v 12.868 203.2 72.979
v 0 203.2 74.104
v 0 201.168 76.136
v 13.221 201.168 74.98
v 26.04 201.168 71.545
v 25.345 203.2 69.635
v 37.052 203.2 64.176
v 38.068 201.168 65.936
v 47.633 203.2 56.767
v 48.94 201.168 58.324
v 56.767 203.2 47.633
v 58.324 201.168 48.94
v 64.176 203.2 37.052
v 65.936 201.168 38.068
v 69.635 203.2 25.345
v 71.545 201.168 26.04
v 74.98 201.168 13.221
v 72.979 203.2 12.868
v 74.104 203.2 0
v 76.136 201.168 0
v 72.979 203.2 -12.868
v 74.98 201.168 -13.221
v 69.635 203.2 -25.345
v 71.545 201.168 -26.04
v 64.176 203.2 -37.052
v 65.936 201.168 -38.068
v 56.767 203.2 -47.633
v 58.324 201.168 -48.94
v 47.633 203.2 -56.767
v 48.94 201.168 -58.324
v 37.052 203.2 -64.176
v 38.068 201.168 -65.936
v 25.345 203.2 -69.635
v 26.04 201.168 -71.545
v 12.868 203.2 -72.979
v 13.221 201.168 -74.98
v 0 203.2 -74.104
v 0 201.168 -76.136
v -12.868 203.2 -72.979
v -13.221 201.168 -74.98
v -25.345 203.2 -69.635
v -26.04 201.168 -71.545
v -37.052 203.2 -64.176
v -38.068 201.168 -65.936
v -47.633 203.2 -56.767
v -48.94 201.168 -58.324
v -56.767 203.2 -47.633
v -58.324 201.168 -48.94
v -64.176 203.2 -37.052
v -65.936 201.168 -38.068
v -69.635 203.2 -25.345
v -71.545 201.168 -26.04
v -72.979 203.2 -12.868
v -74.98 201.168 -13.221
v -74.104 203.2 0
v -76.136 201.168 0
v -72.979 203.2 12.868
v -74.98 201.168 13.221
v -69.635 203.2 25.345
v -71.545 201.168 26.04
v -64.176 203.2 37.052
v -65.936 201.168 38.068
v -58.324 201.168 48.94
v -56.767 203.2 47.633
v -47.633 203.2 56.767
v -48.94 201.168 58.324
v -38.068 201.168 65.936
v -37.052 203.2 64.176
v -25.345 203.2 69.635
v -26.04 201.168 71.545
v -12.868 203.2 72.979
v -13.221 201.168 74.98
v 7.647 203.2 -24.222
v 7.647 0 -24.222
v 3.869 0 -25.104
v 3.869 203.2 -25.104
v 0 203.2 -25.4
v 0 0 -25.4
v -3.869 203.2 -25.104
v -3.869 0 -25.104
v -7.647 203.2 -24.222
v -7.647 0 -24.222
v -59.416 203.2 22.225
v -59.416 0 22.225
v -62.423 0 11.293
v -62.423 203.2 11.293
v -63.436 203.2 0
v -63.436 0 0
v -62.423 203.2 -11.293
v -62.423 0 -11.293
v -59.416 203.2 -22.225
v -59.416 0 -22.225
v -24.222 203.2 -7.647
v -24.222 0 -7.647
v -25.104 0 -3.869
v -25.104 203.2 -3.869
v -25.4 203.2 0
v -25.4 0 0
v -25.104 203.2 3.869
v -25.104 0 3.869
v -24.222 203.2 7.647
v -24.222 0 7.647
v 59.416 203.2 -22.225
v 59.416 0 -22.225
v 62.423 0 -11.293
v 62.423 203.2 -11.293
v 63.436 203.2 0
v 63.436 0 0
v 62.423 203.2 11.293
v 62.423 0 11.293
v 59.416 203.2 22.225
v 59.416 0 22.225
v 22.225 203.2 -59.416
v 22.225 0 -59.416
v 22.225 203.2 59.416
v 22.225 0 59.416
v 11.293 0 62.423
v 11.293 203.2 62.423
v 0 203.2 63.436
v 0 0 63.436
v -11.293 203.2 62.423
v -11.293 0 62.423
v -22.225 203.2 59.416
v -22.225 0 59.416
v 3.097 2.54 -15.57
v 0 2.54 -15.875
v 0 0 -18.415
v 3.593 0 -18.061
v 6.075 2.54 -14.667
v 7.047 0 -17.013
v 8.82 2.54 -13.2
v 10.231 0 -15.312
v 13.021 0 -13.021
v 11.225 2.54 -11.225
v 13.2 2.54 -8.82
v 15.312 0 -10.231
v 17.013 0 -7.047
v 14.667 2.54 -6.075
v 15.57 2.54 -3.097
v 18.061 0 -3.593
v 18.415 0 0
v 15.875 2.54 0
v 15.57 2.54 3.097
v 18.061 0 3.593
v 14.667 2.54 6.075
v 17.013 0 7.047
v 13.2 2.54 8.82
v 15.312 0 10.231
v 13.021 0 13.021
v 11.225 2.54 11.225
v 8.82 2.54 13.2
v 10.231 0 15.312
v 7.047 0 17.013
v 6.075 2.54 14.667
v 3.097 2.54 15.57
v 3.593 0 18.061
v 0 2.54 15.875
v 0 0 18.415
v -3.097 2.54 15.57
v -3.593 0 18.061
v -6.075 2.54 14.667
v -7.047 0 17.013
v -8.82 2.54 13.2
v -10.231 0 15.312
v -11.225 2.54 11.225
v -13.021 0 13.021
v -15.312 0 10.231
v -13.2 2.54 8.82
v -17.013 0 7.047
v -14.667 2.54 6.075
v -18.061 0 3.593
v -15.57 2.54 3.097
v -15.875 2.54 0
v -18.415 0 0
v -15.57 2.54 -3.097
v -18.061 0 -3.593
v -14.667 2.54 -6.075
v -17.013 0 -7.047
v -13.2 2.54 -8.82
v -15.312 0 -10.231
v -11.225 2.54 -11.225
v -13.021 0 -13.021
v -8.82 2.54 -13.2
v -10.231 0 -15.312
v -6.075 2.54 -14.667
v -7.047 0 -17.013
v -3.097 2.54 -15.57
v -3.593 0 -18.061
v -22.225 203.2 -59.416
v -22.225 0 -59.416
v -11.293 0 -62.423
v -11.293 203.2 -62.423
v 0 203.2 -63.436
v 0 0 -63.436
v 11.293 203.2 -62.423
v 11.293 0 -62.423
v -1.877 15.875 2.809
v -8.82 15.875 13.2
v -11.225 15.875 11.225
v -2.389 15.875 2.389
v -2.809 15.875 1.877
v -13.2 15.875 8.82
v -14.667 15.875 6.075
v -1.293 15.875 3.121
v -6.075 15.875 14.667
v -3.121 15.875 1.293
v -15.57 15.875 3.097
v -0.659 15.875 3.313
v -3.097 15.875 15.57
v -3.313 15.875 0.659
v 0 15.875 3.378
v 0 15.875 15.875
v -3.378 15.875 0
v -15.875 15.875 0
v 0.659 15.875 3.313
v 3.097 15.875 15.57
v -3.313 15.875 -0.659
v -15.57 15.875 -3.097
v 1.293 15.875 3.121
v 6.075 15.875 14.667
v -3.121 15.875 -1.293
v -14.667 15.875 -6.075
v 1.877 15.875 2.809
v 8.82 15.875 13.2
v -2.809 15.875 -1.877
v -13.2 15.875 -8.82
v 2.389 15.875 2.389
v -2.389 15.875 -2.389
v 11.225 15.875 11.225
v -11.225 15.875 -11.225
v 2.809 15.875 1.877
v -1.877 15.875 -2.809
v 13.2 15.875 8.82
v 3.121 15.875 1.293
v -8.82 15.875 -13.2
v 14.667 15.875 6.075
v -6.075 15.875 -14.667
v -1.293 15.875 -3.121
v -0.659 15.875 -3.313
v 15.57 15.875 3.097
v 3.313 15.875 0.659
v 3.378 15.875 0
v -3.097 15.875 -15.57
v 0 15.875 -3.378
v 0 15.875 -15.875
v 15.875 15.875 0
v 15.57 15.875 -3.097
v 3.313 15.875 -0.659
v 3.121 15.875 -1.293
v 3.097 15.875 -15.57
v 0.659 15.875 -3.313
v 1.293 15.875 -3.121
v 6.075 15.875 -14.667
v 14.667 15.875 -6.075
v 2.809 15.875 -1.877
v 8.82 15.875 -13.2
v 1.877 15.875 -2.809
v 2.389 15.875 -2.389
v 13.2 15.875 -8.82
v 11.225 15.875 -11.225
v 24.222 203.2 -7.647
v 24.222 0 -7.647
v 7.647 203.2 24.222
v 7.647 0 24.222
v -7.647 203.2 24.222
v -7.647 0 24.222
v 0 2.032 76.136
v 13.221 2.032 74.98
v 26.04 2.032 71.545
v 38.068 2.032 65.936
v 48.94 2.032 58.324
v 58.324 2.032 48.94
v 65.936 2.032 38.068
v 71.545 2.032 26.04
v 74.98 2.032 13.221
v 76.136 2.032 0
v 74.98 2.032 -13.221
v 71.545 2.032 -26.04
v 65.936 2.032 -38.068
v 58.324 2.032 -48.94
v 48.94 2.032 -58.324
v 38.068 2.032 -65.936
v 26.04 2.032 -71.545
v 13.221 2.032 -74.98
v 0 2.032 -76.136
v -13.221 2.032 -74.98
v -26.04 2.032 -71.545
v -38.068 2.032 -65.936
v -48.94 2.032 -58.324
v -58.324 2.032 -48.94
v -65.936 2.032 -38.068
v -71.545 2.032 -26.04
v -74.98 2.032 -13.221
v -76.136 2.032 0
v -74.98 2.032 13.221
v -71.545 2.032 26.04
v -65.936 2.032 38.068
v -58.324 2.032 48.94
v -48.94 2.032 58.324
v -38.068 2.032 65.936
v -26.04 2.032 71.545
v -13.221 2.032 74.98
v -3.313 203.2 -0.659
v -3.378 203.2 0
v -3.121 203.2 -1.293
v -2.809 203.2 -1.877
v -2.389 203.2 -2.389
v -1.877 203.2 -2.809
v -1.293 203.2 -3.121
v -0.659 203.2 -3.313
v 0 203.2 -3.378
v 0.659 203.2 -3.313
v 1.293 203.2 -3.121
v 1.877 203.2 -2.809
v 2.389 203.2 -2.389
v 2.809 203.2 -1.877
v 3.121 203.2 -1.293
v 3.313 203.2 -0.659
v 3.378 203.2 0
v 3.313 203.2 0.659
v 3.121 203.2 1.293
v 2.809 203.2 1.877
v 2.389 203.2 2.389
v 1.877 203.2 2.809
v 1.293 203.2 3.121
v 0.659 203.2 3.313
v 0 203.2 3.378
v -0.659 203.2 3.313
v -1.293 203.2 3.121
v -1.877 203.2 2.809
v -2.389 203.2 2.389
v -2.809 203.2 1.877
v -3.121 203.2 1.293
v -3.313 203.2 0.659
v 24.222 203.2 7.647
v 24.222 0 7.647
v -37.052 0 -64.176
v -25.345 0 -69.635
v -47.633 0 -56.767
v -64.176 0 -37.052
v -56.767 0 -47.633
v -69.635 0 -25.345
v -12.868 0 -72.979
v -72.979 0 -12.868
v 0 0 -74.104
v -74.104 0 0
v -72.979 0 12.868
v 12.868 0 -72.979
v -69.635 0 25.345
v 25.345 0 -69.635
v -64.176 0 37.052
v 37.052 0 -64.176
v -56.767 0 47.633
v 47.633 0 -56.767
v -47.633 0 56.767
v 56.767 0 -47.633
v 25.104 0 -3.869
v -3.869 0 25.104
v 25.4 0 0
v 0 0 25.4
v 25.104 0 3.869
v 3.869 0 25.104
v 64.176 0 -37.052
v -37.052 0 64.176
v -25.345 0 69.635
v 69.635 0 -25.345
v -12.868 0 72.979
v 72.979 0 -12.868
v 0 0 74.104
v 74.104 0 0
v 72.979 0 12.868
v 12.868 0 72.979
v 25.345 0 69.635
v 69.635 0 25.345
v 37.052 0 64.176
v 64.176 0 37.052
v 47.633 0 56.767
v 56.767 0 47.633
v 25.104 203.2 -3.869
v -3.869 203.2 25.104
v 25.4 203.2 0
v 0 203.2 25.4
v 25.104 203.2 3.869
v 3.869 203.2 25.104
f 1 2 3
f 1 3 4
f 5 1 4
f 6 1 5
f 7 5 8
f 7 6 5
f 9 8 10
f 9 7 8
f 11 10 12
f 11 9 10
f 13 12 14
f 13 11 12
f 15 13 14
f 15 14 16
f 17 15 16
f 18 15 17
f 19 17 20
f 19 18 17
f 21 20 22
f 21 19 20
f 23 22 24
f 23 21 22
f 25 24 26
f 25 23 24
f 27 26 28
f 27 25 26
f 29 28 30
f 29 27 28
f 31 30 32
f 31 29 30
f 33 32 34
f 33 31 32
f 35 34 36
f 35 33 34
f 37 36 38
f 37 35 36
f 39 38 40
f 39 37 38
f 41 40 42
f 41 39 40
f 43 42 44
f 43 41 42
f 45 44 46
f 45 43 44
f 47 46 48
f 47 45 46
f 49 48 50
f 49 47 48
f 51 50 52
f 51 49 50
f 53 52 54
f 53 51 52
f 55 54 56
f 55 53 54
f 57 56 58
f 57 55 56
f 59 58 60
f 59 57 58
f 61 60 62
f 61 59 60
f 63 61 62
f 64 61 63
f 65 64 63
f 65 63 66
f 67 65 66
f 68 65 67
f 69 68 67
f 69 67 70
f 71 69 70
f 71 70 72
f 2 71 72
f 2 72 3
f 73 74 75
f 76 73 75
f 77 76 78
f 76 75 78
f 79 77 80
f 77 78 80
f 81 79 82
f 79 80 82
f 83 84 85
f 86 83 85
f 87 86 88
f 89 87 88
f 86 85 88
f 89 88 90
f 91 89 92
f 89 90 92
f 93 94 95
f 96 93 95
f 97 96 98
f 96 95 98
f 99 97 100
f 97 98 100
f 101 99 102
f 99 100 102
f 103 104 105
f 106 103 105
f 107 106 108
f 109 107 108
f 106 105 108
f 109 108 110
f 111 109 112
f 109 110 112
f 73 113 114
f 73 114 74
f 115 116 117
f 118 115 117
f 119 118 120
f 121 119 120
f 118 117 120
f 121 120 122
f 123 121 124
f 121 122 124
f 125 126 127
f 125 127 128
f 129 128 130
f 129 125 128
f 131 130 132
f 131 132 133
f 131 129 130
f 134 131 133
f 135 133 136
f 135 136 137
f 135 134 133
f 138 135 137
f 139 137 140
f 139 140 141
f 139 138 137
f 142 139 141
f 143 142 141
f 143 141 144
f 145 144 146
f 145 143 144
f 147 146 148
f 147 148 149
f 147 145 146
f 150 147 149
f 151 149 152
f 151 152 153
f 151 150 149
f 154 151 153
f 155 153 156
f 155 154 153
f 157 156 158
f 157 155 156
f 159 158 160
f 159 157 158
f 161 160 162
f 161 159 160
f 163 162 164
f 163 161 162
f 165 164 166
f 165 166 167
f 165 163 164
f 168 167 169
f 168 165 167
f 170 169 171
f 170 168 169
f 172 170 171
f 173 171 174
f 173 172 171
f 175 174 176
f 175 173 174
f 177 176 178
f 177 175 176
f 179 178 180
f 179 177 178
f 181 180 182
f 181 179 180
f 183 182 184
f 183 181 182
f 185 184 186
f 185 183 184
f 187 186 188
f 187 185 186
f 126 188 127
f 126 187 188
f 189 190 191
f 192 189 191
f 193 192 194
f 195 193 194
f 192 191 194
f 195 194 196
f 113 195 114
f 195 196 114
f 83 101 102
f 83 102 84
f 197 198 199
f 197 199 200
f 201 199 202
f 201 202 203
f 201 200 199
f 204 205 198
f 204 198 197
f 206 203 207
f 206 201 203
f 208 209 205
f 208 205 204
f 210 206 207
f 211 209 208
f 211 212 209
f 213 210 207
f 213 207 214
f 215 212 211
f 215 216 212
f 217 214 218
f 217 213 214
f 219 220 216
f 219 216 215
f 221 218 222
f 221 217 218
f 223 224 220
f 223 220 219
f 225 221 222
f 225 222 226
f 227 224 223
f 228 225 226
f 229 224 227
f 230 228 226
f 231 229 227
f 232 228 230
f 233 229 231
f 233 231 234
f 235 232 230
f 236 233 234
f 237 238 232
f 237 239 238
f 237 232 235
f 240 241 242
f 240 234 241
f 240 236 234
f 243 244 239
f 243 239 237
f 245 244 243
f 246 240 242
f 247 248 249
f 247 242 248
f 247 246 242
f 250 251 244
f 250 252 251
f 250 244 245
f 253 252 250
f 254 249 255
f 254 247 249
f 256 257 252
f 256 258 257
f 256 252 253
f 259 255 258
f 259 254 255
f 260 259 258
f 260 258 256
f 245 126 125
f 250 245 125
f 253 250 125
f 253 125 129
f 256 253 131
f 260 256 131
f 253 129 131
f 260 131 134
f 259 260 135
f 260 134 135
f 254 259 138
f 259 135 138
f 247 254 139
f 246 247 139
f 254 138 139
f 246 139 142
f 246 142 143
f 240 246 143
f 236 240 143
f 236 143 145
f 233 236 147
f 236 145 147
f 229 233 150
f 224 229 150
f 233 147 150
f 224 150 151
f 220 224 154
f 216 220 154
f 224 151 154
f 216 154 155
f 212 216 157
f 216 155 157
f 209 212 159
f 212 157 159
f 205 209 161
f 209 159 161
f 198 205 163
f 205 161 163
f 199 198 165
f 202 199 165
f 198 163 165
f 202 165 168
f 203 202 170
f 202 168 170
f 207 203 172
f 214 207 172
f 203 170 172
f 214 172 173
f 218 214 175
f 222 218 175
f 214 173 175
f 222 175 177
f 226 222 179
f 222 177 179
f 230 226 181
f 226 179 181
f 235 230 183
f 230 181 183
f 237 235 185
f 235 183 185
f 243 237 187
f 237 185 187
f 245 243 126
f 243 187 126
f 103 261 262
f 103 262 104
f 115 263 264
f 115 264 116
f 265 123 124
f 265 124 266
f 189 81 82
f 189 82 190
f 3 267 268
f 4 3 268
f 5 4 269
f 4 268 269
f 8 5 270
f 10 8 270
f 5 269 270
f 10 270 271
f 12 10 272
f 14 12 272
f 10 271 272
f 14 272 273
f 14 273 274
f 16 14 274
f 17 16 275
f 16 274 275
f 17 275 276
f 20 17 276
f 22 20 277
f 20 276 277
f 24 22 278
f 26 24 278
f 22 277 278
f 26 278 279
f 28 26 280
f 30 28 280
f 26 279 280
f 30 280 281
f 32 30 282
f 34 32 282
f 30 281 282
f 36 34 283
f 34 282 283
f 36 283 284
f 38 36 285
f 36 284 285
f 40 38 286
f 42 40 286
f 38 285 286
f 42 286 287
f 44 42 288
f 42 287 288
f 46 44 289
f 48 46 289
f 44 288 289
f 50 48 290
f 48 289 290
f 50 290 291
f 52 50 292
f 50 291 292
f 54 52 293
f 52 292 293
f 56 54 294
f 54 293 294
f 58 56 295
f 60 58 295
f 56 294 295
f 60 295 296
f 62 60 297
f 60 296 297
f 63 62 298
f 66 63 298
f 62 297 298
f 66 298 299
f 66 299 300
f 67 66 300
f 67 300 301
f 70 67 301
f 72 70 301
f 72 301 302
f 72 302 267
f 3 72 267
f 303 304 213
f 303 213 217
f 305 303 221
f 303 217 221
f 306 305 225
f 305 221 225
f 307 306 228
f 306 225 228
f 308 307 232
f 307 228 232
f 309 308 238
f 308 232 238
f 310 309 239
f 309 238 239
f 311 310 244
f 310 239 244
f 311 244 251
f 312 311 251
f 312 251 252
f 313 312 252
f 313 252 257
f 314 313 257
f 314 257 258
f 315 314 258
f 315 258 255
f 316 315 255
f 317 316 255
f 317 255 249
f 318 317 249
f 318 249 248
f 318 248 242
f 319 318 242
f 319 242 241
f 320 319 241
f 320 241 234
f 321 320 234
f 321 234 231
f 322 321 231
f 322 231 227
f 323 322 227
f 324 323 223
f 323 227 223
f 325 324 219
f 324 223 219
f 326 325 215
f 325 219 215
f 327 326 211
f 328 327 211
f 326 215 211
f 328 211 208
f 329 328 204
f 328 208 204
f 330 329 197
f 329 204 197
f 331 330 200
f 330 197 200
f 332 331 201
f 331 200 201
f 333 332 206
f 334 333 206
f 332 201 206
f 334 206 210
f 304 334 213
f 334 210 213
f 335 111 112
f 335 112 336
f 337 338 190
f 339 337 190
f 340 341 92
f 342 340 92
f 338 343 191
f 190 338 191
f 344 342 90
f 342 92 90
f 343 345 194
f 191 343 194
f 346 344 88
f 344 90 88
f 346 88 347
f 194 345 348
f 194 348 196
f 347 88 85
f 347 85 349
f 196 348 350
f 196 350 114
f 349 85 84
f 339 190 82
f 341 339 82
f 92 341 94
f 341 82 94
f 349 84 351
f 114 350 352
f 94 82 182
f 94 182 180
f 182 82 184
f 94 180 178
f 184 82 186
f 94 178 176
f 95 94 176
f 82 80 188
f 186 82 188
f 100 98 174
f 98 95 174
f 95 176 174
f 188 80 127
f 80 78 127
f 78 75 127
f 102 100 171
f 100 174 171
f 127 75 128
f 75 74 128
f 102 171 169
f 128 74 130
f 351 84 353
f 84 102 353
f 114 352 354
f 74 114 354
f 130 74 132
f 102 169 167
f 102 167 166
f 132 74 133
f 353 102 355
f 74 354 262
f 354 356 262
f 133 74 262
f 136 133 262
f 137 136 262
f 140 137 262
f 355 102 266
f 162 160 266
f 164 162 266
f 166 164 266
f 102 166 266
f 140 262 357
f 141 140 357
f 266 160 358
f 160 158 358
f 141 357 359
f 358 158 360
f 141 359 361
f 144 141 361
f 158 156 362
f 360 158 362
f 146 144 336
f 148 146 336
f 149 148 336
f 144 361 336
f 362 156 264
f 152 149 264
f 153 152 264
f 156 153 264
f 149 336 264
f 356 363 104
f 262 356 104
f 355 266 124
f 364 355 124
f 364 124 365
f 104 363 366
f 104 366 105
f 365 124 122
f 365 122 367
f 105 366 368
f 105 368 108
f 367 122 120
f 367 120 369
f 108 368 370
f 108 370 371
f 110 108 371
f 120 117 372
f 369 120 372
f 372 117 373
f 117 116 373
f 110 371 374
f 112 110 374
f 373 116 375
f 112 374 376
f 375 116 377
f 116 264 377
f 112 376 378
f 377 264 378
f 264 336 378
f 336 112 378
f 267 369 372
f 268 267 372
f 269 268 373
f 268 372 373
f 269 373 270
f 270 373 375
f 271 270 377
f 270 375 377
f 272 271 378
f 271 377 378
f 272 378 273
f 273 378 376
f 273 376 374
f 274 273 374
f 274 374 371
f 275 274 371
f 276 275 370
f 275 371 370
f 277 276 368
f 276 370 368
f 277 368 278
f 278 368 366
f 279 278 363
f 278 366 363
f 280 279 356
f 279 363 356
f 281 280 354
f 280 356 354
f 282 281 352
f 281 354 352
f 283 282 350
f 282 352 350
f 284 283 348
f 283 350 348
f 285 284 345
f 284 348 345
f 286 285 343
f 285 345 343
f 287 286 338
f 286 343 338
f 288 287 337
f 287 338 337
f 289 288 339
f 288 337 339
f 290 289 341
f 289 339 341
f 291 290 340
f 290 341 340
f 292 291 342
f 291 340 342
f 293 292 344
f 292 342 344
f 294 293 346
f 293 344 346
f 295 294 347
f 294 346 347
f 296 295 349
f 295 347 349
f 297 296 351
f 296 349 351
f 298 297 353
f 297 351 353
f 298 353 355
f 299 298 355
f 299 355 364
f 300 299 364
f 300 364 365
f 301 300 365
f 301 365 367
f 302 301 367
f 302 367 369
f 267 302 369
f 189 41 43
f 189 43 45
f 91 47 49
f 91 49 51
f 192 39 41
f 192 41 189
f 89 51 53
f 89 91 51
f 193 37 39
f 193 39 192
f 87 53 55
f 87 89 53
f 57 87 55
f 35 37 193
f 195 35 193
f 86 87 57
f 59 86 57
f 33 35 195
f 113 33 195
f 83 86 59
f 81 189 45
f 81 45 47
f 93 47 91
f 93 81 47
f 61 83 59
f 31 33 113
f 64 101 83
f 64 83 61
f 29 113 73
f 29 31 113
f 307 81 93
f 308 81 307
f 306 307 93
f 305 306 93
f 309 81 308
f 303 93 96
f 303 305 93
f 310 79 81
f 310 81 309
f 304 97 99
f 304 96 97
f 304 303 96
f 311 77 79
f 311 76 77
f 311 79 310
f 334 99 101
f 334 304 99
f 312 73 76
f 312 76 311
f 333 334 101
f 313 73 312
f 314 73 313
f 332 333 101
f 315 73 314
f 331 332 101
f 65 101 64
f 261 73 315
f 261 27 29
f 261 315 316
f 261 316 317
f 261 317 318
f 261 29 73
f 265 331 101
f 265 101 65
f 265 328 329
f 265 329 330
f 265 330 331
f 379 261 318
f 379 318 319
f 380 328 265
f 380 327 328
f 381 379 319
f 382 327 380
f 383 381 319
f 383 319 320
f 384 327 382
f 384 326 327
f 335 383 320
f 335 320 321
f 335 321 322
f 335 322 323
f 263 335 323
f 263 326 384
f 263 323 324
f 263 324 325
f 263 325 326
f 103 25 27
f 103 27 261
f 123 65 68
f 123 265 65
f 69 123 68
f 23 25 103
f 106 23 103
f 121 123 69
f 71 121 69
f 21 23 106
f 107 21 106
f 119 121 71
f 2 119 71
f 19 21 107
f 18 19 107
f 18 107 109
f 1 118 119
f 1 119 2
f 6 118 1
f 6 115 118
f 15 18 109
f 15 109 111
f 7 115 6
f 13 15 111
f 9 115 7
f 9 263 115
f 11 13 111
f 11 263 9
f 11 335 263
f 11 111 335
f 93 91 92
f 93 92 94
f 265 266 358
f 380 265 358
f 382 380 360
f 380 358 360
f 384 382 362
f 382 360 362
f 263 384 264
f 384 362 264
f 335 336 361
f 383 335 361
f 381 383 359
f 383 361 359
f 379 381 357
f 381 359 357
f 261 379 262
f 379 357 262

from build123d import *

# Parameters (mm, degrees)
SKETCH1_R               = 76.1365
BOSS_EXTRUDE1_DEPTH     = 203.2
CHAMFER1_SIZE           = 2.032
CUT_EXTRUDE2_DEPTH      = 230.964721782
CUT_EXTRUDE2_DEPTH_BACK = 230.964721782
F_1_4_CLEARANCE_HOLE1_D = 6.7564
SKETCH6_R               = 15.875
CUT_EXTRUDE3_DEPTH      = 15.875
CHAMFER2_SIZE           = 2.54


with BuildPart() as part:
    # Sketch1 → Boss-Extrude1 (new body)
    with BuildSketch(Plane(origin=(0, 0, 0), x_dir=(1, 0, 0), z_dir=(0, 1, 0))):
        with Locations(Location((0, 0, 0), (0, 0, 270))):
            Circle(SKETCH1_R)
    extrude(amount=BOSS_EXTRUDE1_DEPTH)

    # Chamfer1
    chamfer1_edges = [part.edges().sort_by_distance(p)[0] for p in [
        (0, 0, -76.1365),
        (0, 203.2, -76.1365),
    ]]
    chamfer(chamfer1_edges, length=CHAMFER1_SIZE)

    # Sketch3 → Cut-Extrude2 (cut, two sides: drawn at the far end of the back side and taken through both)
    with BuildSketch(Plane(origin=(0, 203.2, 0), x_dir=(1, 0, 0), z_dir=(0, 1, 0)).offset(-CUT_EXTRUDE2_DEPTH_BACK)):
        with BuildLine():
            Line((-7.6470512, 24.221531908), (-22.225, 59.415813613))
            ThreePointArc((-22.225, 59.415813613), (0, 63.4365), (22.225, 59.415813613))
            Line((22.225, 59.415813613), (7.6470512, 24.221531908))
            ThreePointArc((7.6470512, 24.221531908), (0, 25.4), (-7.6470512, 24.221531908))
        make_face()
        with BuildLine():
            Line((24.221531908, 7.6470512), (59.415813613, 22.225))
            ThreePointArc((59.415813613, 22.225), (63.4365, 0), (59.415813613, -22.225))
            Line((59.415813613, -22.225), (24.221531908, -7.6470512))
            ThreePointArc((24.221531908, -7.6470512), (25.4, 0), (24.221531908, 7.6470512))
        make_face()
        with BuildLine():
            Line((7.6470512, -24.221531908), (22.225, -59.415813613))
            ThreePointArc((22.225, -59.415813613), (0, -63.4365), (-22.225, -59.415813613))
            Line((-22.225, -59.415813613), (-7.6470512, -24.221531908))
            ThreePointArc((-7.6470512, -24.221531908), (0, -25.4), (7.6470512, -24.221531908))
        make_face()
        with BuildLine():
            Line((-24.221531908, -7.6470512), (-59.415813613, -22.225))
            ThreePointArc((-59.415813613, -22.225), (-63.4365, 0), (-59.415813613, 22.225))
            Line((-59.415813613, 22.225), (-24.221531908, 7.6470512))
            ThreePointArc((-24.221531908, 7.6470512), (-25.4, 0), (-24.221531908, -7.6470512))
        make_face()
    extrude(amount=CUT_EXTRUDE2_DEPTH + CUT_EXTRUDE2_DEPTH_BACK, mode=Mode.SUBTRACT)

    # 1/4 Clearance Hole1 (through all)
    with Locations(Plane(origin=(0, 203.2, 0), x_dir=(1, 0, 0), z_dir=(0, 1, 0))):
        with Locations((0, 0)):
            Hole(F_1_4_CLEARANCE_HOLE1_D / 2)

    # Sketch6 → Cut-Extrude3 (cut)
    with BuildSketch(Plane.XZ):
        with Locations(Location((0, 0, 0), (0, 0, 270))):
            Circle(SKETCH6_R)
    extrude(amount=-CUT_EXTRUDE3_DEPTH, mode=Mode.SUBTRACT)

    # Chamfer2
    chamfer2_edges = [part.edges().sort_by_distance(p)[0] for p in [
        (0, 0, 15.875),
    ]]
    chamfer(chamfer2_edges, length=CHAMFER2_SIZE)


solid = part.part
